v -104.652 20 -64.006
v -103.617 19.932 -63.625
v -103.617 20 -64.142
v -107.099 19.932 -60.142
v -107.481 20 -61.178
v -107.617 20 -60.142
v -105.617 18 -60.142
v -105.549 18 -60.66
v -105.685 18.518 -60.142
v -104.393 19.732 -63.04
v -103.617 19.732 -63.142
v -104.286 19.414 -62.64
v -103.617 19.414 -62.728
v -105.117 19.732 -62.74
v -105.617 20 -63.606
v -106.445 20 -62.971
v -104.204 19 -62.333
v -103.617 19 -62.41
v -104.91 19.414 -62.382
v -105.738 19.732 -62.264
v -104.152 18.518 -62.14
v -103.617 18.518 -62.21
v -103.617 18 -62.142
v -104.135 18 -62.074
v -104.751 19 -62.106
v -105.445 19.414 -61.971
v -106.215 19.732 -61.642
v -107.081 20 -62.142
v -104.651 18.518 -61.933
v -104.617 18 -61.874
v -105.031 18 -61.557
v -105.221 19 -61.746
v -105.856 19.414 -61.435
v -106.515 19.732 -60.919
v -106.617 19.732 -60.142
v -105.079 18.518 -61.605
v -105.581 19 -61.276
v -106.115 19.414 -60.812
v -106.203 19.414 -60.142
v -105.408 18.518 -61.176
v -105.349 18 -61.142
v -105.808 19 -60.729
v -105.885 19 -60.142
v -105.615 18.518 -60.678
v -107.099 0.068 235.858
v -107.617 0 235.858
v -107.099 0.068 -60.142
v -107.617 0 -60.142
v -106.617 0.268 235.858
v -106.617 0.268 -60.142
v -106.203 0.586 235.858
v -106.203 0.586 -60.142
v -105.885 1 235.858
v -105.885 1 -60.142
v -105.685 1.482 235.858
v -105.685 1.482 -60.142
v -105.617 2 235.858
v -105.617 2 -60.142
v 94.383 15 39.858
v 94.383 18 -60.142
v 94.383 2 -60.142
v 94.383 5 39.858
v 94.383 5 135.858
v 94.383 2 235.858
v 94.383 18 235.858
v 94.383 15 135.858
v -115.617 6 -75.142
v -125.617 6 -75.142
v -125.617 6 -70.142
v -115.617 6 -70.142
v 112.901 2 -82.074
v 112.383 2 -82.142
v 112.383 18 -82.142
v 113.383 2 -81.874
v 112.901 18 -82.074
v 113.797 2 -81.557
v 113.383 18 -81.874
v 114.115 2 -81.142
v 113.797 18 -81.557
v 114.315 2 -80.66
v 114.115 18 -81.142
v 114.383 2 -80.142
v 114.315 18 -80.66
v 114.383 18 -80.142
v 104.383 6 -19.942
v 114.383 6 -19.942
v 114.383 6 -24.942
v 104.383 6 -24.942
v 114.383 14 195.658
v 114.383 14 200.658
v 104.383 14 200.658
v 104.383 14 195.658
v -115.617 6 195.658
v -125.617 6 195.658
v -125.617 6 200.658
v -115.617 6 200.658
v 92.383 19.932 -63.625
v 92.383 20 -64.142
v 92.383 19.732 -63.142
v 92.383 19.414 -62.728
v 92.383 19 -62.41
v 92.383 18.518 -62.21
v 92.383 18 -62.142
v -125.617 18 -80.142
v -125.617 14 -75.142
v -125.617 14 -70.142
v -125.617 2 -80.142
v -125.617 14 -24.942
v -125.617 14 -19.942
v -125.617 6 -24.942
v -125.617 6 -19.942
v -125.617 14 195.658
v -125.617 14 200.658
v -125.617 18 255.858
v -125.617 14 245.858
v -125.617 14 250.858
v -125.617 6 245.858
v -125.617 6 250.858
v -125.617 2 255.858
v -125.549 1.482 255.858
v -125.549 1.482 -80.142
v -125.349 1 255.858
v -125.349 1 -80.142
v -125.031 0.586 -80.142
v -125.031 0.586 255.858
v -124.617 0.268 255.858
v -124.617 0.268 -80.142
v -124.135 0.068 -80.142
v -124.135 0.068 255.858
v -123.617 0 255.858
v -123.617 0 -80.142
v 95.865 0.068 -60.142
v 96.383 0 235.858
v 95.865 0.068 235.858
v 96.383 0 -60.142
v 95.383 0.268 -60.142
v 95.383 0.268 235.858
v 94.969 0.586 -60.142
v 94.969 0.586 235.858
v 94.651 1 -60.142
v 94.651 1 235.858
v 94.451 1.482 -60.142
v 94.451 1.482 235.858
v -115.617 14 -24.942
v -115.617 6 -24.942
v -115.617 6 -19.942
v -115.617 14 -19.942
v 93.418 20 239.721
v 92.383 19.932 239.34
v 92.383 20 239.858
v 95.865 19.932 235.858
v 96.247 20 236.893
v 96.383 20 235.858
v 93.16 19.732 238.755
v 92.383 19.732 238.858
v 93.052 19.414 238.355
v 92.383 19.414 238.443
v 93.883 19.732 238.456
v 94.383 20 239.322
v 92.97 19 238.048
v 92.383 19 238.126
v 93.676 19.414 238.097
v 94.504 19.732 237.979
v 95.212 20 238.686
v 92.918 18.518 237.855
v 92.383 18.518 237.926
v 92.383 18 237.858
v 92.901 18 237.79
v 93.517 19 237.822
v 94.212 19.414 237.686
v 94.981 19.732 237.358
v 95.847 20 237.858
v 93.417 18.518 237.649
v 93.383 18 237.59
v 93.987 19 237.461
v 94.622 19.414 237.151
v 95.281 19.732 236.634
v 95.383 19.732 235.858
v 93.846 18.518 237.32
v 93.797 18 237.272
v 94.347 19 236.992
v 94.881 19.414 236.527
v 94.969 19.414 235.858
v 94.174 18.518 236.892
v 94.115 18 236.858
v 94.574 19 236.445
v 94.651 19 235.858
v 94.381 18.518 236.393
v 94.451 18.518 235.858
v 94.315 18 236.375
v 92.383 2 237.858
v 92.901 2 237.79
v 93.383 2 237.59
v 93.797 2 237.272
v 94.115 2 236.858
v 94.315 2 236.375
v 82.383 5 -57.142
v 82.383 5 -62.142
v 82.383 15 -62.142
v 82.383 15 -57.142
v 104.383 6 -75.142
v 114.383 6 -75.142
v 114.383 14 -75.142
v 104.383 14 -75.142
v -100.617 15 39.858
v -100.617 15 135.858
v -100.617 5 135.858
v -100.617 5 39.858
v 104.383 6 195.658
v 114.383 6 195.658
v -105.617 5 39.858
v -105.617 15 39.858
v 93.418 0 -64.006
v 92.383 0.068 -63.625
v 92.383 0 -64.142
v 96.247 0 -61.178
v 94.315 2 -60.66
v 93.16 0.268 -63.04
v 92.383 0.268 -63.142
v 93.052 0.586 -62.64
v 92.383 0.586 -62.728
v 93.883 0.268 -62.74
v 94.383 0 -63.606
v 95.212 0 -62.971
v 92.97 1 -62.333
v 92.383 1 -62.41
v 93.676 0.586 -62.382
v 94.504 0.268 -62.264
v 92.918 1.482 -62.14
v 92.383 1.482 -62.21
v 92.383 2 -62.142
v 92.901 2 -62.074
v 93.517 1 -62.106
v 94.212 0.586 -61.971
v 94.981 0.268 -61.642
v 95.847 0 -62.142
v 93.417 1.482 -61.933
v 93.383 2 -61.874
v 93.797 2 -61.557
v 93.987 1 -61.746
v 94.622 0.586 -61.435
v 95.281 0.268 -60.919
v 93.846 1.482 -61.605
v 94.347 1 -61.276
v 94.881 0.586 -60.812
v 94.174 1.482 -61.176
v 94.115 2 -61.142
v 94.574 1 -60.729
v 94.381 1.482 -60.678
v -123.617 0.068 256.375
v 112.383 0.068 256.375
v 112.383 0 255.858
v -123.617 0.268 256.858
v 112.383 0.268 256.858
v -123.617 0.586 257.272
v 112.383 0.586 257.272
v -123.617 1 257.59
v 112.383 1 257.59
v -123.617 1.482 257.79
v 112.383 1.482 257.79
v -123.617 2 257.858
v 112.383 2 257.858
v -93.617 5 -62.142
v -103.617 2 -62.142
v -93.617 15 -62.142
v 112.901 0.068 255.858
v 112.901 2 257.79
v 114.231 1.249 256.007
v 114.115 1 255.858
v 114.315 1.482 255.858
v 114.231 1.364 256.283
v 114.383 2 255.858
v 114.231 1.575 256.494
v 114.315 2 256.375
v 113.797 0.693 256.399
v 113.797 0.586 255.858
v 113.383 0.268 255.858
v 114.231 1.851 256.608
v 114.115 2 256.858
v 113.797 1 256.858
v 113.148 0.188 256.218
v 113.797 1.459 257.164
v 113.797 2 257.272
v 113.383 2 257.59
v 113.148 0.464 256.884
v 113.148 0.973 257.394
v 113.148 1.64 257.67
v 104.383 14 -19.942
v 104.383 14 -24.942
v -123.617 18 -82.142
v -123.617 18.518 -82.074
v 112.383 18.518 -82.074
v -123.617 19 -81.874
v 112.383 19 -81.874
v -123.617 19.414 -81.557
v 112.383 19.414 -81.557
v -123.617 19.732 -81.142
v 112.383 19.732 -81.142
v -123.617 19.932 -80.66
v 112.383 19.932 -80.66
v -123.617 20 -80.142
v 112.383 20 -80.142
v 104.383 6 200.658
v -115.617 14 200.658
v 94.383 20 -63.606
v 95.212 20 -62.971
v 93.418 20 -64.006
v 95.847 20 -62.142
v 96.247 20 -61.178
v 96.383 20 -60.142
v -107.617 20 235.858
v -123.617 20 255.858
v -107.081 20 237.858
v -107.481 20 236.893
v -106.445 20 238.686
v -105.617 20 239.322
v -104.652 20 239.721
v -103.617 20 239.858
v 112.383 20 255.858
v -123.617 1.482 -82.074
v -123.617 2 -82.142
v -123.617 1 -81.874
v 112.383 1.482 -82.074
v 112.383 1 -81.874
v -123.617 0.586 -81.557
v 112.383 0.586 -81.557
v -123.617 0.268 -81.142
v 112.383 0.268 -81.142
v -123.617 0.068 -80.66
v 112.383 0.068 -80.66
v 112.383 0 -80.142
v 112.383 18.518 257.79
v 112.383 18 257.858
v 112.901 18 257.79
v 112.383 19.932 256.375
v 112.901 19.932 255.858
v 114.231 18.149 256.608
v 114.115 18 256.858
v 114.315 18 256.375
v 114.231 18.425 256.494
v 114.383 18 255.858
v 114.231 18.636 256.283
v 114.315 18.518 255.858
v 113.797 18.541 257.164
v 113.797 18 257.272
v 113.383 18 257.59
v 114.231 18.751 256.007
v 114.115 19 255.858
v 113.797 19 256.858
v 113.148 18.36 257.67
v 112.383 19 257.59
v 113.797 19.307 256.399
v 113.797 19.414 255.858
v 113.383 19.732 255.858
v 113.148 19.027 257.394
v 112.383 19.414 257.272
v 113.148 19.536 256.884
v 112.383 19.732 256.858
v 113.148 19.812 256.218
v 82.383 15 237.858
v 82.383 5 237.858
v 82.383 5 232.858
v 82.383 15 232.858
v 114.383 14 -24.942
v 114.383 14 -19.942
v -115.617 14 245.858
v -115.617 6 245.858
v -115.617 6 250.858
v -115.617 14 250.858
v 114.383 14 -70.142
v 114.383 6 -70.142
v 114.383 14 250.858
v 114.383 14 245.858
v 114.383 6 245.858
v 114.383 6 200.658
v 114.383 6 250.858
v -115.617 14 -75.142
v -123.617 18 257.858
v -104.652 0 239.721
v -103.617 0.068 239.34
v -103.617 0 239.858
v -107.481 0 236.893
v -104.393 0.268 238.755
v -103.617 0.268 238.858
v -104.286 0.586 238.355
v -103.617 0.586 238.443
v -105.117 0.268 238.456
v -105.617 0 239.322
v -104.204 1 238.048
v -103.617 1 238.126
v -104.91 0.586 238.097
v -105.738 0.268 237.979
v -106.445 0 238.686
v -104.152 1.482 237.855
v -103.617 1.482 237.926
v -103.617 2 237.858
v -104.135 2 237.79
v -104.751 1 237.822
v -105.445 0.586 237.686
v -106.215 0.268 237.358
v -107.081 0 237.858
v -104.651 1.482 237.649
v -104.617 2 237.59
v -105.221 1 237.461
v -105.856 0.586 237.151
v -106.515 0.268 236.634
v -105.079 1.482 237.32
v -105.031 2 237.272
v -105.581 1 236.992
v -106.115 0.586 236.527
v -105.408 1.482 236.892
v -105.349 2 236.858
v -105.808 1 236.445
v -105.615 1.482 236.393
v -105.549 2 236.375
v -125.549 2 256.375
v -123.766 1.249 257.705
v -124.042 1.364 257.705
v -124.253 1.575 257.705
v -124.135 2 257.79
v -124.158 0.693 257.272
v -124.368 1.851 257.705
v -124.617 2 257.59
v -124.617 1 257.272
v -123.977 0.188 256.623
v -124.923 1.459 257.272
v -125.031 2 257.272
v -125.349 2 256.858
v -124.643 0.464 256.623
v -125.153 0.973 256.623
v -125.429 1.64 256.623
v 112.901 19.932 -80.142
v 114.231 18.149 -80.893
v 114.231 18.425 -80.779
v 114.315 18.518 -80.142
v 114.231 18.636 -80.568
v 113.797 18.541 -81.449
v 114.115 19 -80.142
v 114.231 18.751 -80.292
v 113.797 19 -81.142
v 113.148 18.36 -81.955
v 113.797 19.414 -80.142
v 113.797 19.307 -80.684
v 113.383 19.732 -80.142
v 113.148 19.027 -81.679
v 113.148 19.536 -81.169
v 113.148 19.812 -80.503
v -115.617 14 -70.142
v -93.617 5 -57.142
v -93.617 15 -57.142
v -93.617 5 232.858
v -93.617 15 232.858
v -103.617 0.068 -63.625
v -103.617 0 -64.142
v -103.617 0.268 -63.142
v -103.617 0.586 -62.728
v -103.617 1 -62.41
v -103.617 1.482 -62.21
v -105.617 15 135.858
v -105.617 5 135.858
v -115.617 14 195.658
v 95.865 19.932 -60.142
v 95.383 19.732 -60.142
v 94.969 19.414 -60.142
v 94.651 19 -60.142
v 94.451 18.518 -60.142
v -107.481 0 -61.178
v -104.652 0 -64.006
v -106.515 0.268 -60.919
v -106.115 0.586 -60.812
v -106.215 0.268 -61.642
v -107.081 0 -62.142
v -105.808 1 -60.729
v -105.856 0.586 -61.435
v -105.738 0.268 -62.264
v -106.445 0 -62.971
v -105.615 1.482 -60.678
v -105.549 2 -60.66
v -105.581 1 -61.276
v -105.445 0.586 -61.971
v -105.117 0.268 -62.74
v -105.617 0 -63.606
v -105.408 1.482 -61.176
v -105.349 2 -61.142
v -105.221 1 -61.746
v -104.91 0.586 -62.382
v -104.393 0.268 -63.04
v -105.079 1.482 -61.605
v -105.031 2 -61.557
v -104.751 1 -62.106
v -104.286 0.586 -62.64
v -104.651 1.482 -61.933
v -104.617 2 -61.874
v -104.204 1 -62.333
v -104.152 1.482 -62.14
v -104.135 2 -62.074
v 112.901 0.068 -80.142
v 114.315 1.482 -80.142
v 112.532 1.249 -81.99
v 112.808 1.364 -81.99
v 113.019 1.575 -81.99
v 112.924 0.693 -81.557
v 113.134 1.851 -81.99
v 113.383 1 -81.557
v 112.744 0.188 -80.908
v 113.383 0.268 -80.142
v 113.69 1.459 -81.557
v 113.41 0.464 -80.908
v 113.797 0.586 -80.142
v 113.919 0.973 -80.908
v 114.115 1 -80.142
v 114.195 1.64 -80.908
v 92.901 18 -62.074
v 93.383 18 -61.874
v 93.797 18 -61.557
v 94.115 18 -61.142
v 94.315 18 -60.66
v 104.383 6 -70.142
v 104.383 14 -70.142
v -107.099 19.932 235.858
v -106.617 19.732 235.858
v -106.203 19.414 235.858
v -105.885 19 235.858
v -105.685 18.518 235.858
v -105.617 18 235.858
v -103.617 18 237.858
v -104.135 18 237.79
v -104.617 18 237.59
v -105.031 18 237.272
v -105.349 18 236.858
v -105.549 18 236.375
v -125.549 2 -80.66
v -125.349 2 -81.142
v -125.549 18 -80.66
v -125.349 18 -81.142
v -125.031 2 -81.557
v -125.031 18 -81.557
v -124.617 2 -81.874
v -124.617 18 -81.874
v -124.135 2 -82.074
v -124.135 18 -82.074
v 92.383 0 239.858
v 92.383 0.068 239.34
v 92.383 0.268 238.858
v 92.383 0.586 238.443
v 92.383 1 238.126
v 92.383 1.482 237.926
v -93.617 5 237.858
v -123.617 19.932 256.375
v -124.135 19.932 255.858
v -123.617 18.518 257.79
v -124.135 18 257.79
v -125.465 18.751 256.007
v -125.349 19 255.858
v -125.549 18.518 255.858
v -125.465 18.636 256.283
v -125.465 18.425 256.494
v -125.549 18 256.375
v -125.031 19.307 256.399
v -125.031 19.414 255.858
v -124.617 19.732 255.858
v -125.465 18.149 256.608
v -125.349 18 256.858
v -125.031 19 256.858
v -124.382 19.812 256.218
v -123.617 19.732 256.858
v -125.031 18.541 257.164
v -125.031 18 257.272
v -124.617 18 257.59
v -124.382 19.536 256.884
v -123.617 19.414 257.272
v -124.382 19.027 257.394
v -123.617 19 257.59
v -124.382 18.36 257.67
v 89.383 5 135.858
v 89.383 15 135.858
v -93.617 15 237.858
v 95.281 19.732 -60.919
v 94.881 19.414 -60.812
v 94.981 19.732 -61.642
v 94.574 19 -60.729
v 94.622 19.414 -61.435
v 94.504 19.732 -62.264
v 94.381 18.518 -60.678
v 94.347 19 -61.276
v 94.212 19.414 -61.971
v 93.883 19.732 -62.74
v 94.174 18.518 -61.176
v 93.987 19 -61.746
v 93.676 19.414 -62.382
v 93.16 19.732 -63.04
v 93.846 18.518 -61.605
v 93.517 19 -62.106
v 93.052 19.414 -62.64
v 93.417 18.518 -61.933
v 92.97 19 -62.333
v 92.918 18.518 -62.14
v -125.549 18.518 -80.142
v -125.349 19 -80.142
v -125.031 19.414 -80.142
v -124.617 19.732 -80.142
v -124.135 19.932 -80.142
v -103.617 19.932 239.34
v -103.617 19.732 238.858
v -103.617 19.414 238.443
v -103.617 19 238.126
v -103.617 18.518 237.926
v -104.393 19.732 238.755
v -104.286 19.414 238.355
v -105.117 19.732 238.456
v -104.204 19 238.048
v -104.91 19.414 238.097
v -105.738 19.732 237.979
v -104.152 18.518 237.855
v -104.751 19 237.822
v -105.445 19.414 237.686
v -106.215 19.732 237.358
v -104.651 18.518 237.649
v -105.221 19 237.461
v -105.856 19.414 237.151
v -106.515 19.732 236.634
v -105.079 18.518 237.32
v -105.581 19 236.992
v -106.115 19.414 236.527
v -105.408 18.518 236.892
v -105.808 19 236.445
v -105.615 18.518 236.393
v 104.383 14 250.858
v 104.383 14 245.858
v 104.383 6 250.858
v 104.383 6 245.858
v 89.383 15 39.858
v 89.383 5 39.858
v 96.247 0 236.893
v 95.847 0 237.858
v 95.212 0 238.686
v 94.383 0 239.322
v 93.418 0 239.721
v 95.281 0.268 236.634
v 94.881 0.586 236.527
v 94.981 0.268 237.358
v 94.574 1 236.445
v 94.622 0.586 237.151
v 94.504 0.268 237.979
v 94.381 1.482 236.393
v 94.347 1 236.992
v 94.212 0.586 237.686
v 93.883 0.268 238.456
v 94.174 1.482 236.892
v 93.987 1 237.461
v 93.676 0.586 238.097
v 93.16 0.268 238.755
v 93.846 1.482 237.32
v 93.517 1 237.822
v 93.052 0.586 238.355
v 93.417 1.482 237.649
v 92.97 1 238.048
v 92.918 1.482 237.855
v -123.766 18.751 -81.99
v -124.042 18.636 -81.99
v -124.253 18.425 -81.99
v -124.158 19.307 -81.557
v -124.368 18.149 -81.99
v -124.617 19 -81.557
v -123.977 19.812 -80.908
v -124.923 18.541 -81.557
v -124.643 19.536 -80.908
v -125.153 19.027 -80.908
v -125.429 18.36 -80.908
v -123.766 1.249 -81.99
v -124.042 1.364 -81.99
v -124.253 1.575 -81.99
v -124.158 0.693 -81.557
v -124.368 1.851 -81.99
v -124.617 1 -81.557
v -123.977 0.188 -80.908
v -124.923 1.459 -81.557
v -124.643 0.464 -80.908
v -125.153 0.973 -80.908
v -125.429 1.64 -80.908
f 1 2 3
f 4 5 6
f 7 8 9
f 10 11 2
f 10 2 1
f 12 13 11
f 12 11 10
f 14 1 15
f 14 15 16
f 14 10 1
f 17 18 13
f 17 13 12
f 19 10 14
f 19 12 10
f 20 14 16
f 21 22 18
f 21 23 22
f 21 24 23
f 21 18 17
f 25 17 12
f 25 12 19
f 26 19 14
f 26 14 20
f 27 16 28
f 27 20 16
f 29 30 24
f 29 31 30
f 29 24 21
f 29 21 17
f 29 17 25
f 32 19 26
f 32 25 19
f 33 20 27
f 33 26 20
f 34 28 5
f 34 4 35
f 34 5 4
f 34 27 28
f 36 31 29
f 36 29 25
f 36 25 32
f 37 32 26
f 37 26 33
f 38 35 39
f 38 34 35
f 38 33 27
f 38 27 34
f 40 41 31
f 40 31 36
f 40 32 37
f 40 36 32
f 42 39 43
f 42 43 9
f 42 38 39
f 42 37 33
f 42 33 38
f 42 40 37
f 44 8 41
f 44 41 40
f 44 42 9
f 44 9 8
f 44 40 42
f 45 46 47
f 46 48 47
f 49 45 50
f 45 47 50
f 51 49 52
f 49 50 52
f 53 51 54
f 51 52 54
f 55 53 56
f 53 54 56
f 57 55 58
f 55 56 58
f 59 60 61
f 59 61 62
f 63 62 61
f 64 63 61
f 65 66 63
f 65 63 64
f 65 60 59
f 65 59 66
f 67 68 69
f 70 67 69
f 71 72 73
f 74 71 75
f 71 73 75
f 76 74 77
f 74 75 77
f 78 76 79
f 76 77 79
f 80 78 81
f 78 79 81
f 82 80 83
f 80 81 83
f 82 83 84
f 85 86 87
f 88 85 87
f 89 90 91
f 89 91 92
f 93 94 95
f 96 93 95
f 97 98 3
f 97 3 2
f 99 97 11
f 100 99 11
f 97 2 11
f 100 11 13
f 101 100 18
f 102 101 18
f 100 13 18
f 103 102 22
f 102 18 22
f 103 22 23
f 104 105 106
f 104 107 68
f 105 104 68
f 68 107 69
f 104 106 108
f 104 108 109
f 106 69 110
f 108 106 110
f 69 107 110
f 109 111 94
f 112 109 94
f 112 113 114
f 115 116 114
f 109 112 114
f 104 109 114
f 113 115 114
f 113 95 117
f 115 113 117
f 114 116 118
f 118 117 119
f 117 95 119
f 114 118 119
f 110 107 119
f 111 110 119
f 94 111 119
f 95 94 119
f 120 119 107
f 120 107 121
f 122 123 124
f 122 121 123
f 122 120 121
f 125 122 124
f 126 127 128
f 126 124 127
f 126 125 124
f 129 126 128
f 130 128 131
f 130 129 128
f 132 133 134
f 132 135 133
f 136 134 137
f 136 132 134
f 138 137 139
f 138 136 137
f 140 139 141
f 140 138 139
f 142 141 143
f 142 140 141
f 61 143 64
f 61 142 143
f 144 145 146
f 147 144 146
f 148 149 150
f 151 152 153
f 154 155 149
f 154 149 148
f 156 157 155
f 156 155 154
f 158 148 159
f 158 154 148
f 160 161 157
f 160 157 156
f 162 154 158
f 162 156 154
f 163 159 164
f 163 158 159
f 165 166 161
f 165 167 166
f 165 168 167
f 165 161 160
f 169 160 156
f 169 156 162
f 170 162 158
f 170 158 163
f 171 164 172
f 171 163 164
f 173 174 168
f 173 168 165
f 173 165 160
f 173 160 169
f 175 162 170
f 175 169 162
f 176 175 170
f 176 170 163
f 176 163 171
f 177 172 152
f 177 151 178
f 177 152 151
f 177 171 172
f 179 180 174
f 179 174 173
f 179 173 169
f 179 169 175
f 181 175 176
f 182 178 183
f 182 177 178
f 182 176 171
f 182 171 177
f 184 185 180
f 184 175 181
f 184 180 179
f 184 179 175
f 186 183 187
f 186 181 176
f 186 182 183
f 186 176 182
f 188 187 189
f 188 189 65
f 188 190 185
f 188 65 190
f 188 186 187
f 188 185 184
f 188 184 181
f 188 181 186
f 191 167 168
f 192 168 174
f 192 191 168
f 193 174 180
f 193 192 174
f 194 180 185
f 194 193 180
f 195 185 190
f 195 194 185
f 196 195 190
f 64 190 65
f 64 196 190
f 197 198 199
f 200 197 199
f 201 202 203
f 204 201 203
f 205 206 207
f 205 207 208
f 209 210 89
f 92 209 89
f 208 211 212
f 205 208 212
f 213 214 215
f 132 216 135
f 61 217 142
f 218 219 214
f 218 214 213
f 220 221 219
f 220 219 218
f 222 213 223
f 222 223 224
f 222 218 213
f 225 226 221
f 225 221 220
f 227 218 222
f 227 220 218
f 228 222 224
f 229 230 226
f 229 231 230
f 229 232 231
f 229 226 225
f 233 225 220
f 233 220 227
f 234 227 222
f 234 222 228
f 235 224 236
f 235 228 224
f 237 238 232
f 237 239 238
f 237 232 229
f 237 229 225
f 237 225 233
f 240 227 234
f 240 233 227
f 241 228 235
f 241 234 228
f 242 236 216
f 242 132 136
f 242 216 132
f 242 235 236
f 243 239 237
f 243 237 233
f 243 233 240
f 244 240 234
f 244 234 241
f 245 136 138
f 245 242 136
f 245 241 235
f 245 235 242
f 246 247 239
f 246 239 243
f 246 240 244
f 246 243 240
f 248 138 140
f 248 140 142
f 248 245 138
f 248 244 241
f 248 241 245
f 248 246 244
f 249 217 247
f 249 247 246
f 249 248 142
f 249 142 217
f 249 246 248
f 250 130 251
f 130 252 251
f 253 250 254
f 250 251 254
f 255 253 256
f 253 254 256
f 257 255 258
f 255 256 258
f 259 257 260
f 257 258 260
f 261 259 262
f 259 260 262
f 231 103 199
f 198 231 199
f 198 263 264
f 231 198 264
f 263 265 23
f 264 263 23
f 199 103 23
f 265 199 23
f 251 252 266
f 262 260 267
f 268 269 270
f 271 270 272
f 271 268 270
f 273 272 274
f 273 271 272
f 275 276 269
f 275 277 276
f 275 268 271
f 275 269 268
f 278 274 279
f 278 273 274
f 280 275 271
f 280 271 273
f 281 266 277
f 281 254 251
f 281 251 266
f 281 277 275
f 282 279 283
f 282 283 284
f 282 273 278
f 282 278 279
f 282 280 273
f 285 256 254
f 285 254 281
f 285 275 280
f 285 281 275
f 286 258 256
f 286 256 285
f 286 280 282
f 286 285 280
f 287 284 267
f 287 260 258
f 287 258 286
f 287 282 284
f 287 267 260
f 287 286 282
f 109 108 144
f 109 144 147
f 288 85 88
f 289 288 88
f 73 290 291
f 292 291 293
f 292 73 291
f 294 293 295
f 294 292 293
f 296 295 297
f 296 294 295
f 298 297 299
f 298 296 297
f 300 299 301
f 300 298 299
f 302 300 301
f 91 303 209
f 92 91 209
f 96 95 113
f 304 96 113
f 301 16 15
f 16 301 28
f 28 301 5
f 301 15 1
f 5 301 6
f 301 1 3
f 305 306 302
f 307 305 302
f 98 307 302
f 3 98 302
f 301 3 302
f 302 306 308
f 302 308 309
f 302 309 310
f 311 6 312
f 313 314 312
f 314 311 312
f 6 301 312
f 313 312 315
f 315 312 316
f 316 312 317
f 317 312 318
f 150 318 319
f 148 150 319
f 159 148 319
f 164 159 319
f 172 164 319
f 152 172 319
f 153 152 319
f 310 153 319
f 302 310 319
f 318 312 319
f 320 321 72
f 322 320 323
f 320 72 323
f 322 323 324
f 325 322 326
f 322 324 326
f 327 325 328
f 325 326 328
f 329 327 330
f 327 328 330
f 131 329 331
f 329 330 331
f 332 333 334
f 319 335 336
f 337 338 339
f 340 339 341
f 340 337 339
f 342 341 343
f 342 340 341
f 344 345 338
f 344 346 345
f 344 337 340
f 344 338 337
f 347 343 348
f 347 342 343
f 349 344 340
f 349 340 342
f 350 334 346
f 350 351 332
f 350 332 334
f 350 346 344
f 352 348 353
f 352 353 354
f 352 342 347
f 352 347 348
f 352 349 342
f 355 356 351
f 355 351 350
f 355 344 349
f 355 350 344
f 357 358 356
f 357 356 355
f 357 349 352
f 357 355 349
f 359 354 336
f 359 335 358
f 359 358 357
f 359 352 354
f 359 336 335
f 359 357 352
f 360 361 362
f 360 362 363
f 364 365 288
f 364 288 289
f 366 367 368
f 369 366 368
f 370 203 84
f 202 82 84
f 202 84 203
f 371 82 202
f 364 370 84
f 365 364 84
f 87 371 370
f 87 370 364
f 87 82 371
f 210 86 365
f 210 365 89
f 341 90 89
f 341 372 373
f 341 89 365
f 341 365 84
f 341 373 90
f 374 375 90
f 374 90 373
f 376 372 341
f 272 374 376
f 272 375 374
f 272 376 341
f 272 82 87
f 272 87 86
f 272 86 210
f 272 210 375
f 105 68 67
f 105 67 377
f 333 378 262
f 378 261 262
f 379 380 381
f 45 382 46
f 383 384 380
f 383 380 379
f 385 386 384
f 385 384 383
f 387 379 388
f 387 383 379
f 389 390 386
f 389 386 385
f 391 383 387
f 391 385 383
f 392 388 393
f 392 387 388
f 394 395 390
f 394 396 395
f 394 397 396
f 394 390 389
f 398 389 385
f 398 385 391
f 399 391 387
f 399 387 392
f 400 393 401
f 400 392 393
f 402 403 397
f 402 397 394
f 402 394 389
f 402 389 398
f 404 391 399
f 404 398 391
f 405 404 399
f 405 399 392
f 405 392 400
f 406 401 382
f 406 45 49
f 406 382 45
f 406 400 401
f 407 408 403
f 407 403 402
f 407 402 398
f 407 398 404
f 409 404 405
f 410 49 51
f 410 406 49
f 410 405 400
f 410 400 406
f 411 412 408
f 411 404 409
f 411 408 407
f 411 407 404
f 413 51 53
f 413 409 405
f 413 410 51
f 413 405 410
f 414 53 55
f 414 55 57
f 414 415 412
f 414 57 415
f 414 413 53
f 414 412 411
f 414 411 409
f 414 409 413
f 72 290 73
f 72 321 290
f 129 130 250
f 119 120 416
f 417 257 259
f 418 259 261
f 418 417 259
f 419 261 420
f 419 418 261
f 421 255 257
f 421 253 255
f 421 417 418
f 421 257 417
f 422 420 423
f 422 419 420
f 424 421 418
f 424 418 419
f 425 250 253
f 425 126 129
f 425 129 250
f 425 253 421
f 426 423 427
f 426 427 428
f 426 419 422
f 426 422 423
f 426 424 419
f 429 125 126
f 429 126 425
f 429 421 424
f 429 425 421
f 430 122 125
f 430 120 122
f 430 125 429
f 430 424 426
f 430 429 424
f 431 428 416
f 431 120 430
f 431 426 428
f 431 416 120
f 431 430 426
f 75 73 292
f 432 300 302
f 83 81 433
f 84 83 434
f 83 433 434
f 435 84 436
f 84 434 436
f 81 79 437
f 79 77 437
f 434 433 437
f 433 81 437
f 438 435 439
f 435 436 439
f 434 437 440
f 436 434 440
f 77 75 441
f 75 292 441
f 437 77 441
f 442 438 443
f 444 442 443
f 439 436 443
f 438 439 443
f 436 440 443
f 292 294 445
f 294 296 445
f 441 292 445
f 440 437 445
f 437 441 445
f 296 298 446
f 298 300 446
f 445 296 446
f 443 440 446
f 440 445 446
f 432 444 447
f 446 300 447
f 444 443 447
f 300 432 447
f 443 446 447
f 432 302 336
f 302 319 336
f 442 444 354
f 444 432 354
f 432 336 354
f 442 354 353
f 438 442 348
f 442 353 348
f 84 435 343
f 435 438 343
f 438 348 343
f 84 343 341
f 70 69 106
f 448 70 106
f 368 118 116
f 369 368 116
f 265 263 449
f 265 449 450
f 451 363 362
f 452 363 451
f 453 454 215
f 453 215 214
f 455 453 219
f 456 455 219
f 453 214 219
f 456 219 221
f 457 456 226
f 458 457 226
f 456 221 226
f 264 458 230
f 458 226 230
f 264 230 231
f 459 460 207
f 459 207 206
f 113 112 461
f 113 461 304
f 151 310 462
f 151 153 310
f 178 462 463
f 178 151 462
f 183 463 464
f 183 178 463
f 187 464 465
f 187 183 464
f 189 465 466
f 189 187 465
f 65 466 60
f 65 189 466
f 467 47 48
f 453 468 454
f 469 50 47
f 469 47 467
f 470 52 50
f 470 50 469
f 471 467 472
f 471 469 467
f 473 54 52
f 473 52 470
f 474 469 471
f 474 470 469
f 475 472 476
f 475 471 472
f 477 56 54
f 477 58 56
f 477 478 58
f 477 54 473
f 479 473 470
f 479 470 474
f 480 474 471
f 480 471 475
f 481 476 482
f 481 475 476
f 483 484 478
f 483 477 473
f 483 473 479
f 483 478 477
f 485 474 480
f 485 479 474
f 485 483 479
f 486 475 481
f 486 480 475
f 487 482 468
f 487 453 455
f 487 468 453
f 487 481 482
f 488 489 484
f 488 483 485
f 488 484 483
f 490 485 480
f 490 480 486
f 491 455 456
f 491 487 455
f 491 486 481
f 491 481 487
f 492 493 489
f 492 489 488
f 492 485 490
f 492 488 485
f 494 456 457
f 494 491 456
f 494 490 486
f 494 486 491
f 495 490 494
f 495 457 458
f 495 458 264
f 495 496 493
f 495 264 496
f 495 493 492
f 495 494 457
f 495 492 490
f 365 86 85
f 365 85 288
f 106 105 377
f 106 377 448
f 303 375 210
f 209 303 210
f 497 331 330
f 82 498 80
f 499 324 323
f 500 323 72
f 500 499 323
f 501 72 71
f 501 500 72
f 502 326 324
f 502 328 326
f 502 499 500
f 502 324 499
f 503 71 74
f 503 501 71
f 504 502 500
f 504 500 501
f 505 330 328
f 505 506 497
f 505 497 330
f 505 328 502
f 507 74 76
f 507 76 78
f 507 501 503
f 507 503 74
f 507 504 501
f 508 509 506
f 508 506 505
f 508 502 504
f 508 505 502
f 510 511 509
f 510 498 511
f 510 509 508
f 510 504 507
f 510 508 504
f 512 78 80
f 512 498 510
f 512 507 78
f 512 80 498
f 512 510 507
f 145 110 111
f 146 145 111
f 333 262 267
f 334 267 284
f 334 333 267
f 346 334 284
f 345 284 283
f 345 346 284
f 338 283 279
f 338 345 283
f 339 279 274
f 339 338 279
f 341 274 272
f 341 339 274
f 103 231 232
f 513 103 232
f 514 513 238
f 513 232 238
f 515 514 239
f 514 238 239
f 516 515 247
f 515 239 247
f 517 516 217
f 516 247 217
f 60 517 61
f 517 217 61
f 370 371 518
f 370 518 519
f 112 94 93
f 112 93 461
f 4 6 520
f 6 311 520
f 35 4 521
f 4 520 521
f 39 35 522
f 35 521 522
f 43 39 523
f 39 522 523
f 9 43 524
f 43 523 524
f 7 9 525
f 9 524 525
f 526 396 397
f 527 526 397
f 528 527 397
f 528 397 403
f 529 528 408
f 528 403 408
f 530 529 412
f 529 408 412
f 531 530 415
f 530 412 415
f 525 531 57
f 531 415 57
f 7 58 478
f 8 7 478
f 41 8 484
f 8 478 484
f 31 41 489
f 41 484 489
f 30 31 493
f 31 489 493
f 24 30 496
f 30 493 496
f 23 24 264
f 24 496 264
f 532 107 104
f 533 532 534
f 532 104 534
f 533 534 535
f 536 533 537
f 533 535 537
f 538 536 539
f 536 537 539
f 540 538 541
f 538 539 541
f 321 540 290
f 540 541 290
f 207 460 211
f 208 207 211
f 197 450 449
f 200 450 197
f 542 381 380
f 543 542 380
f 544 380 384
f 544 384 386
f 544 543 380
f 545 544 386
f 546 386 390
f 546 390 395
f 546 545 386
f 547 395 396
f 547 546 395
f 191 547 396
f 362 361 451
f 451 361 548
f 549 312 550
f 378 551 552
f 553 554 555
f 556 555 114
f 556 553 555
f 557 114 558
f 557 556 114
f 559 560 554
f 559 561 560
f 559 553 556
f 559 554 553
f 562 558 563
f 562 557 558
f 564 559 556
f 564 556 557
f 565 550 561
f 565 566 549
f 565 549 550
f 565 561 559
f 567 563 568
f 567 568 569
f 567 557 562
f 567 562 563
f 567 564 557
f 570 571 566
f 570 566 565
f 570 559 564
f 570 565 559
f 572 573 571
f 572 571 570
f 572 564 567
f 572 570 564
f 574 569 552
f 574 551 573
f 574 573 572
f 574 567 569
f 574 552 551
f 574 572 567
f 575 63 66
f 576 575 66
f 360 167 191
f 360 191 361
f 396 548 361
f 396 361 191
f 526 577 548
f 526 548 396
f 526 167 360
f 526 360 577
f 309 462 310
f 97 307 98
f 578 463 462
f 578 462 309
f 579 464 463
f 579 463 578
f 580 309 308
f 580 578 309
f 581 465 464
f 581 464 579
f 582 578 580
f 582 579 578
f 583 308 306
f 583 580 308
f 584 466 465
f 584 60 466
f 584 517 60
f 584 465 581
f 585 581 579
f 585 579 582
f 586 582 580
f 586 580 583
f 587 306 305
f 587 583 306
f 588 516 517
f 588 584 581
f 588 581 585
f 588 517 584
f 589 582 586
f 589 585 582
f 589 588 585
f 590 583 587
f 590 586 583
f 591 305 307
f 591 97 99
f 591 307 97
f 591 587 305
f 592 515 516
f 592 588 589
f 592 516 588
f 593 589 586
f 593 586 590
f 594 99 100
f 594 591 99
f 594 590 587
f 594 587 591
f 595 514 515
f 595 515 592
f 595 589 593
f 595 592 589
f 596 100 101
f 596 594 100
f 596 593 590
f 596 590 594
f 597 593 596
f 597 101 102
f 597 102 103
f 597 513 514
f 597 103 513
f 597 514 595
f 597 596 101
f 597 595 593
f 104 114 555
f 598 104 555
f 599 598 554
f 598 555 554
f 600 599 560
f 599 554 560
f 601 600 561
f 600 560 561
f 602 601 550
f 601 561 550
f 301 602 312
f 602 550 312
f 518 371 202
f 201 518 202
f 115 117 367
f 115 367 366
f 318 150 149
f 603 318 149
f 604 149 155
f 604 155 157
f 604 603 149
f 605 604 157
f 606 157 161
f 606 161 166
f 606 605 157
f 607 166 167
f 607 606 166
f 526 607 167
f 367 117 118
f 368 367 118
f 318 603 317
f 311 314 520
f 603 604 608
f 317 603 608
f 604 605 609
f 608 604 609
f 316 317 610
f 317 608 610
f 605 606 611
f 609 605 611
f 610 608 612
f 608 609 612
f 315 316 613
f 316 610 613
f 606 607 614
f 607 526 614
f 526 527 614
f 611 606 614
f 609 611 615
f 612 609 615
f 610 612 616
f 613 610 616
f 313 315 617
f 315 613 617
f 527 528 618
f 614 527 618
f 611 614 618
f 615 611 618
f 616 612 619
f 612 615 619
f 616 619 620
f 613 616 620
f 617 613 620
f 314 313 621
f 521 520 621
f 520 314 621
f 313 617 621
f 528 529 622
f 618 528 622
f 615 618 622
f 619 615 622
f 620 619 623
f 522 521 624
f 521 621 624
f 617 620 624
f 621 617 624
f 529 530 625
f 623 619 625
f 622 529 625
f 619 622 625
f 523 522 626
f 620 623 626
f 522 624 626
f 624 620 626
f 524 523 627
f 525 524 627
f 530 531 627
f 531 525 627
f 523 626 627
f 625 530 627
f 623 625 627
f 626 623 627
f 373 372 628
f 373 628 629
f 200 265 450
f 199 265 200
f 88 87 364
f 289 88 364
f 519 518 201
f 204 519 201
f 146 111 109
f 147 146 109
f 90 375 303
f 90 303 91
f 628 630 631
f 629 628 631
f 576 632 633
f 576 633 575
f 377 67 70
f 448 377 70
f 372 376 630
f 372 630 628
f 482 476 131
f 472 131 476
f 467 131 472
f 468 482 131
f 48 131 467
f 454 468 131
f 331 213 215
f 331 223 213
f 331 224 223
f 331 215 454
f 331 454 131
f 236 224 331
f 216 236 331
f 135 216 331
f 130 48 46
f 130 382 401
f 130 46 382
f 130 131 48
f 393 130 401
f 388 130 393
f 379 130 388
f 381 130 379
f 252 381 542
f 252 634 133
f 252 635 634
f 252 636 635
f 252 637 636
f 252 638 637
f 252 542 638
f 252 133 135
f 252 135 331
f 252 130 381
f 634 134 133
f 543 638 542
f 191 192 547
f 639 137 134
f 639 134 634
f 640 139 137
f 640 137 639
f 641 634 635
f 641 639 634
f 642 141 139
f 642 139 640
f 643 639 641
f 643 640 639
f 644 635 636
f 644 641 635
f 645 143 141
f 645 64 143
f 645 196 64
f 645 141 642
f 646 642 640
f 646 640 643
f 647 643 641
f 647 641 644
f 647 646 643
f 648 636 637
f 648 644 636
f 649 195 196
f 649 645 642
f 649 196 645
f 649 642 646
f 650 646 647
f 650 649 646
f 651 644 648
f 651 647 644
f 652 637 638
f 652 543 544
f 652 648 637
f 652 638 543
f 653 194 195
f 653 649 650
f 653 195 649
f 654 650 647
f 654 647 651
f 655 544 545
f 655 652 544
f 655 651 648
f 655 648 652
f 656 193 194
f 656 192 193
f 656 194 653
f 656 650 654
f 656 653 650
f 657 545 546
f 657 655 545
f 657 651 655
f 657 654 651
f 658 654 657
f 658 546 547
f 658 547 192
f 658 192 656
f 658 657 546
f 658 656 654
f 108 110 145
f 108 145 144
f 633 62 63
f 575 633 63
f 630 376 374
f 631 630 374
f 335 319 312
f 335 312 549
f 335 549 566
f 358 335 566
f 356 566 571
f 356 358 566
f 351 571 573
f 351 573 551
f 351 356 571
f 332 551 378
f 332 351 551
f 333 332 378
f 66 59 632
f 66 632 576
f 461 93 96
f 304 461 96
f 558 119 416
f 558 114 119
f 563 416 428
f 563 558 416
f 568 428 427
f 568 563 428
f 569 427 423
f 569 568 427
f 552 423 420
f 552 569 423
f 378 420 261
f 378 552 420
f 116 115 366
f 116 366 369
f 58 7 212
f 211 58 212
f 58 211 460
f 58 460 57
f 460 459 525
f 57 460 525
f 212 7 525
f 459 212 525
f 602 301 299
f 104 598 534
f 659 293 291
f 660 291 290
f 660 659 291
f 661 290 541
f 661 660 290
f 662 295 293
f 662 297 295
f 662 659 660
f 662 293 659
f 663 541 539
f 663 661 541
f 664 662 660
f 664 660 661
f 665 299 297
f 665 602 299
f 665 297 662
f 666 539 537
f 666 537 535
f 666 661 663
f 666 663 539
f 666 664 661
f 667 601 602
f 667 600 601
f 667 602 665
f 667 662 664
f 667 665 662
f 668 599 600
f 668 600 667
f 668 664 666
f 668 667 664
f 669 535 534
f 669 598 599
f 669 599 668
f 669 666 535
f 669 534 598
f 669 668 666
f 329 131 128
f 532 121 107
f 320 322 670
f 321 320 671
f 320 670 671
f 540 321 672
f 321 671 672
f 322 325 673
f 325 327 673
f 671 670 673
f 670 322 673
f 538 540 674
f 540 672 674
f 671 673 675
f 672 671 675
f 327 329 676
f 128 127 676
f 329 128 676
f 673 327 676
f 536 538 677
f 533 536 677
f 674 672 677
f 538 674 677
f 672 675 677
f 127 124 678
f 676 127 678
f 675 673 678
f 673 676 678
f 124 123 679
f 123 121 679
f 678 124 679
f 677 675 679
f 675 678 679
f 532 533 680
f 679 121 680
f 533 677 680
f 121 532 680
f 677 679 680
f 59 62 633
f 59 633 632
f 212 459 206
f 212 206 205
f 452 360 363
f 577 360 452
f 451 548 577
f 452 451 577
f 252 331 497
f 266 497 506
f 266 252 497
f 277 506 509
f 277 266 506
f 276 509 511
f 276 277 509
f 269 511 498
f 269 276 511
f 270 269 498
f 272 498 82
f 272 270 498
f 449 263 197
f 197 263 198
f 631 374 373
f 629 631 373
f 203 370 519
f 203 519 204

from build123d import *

# Parameters (mm, degrees)
SKETCH1_W           = 240
SKETCH1_H           = 340
BOSS_EXTRUDE1_DEPTH = 20
SKETCH2_W           = 200
SKETCH2_H           = 300
CUT_EXTRUDE1_DEPTH  = 288.524209706
SKETCH3_W           = 96
SKETCH3_H           = 10
BOSS_EXTRUDE2_DEPTH = 5
SKETCH4_W           = 96
SKETCH4_H           = 10
BOSS_EXTRUDE3_DEPTH = 5
SKETCH5_W           = 176
SKETCH5_H           = 10
BOSS_EXTRUDE4_DEPTH = 5
SKETCH6_W           = 176
SKETCH6_H           = 10
BOSS_EXTRUDE5_DEPTH = 5
SKETCH7_W           = 5
SKETCH7_H           = 8
CUT_EXTRUDE2_DEPTH  = 10
SKETCH8_W           = 5
SKETCH8_H           = 8
CUT_EXTRUDE3_DEPTH  = 10
SKETCH9_W           = 5
SKETCH9_H           = 8
CUT_EXTRUDE4_DEPTH  = 10
SKETCH10_W          = 5
SKETCH10_H          = 8
CUT_EXTRUDE5_DEPTH  = 10
SKETCH11_W          = 5
SKETCH11_H          = 8
CUT_EXTRUDE6_DEPTH  = 10
SKETCH12_W          = 5
SKETCH12_H          = 8
CUT_EXTRUDE7_DEPTH  = 10
SKETCH13_W          = 5
SKETCH13_H          = 8
CUT_EXTRUDE8_DEPTH  = 10
SKETCH14_W          = 5
SKETCH14_H          = 8
CUT_EXTRUDE9_DEPTH  = 10
FILLET1_R           = 2


with BuildPart() as part:
    # Sketch1 → Boss-Extrude1 (new body)
    with BuildSketch(Plane.XZ):
        with Locations((-5.61688401, 87.857653791)):
            Rectangle(SKETCH1_W, SKETCH1_H)
    extrude(amount=-BOSS_EXTRUDE1_DEPTH)

    # Sketch2 → Cut-Extrude1 (cut, through all)
    with BuildSketch(Plane(origin=(0, 20, 0), x_dir=(-1, 0, 0), z_dir=(0, 1, 0))):
        with Locations((5.61688401, 87.857653791)):
            Rectangle(SKETCH2_W, SKETCH2_H)
    extrude(amount=-CUT_EXTRUDE1_DEPTH, mode=Mode.SUBTRACT)

    # Sketch3 → Boss-Extrude2 (add)
    with BuildSketch(Plane(origin=(-105.61688401, 0, 0), x_dir=(0, 0, -1), z_dir=(1, 0, 0))):
        with Locations((-87.857653791, 10)):
            Rectangle(SKETCH3_W, SKETCH3_H)
    extrude(amount=BOSS_EXTRUDE2_DEPTH)

    # Sketch4 → Boss-Extrude3 (add)
    with BuildSketch(Plane.ZY.offset(-94.38311599)):
        with Locations((87.857653791, 10)):
            Rectangle(SKETCH4_W, SKETCH4_H)
    extrude(amount=BOSS_EXTRUDE3_DEPTH)

    # Sketch5 → Boss-Extrude4 (add)
    with BuildSketch(Plane(origin=(0, 0, 237.857653791), x_dir=(-1, 0, 0), z_dir=(0, 0, -1))):
        with Locations((5.61688401, 10)):
            Rectangle(SKETCH5_W, SKETCH5_H)
    extrude(amount=BOSS_EXTRUDE4_DEPTH)

    # Sketch6 → Boss-Extrude5 (add)
    with BuildSketch(Plane.XY.offset(-62.142346209)):
        with Locations((-5.61688401, 10)):
            Rectangle(SKETCH6_W, SKETCH6_H)
    extrude(amount=BOSS_EXTRUDE5_DEPTH)

    # Sketch7 → Cut-Extrude2 (cut)
    with BuildSketch(Plane(origin=(114.38311599, 0, 0), x_dir=(0, 0, -1), z_dir=(1, 0, 0))):
        with Locations((-248.357653791, 10)):
            Rectangle(SKETCH7_W, SKETCH7_H)
    extrude(amount=-CUT_EXTRUDE2_DEPTH, mode=Mode.SUBTRACT)

    # Sketch8 → Cut-Extrude3 (cut)
    with BuildSketch(Plane(origin=(114.38311599, 0, 0), x_dir=(0, 0, -1), z_dir=(1, 0, 0))):
        with Locations((-198.157653791, 10)):
            Rectangle(SKETCH8_W, SKETCH8_H)
    extrude(amount=-CUT_EXTRUDE3_DEPTH, mode=Mode.SUBTRACT)

    # Sketch9 → Cut-Extrude4 (cut)
    with BuildSketch(Plane(origin=(114.38311599, 0, 0), x_dir=(0, 0, -1), z_dir=(1, 0, 0))):
        with Locations((22.442346209, 10)):
            Rectangle(SKETCH9_W, SKETCH9_H)
    extrude(amount=-CUT_EXTRUDE4_DEPTH, mode=Mode.SUBTRACT)

    # Sketch10 → Cut-Extrude5 (cut)
    with BuildSketch(Plane(origin=(114.38311599, 0, 0), x_dir=(0, 0, -1), z_dir=(1, 0, 0))):
        with Locations((72.642346209, 10)):
            Rectangle(SKETCH10_W, SKETCH10_H)
    extrude(amount=-CUT_EXTRUDE5_DEPTH, mode=Mode.SUBTRACT)

    # Sketch11 → Cut-Extrude6 (cut)
    with BuildSketch(Plane.ZY.offset(125.61688401)):
        with Locations((248.357653791, 10)):
            Rectangle(SKETCH11_W, SKETCH11_H)
    extrude(amount=-CUT_EXTRUDE6_DEPTH, mode=Mode.SUBTRACT)

    # Sketch12 → Cut-Extrude7 (cut)
    with BuildSketch(Plane.ZY.offset(125.61688401)):
        with Locations((198.157653791, 10)):
            Rectangle(SKETCH12_W, SKETCH12_H)
    extrude(amount=-CUT_EXTRUDE7_DEPTH, mode=Mode.SUBTRACT)

    # Sketch13 → Cut-Extrude8 (cut)
    with BuildSketch(Plane.ZY.offset(125.61688401)):
        with Locations((-22.442346209, 10)):
            Rectangle(SKETCH13_W, SKETCH13_H)
    extrude(amount=-CUT_EXTRUDE8_DEPTH, mode=Mode.SUBTRACT)

    # Sketch14 → Cut-Extrude9 (cut)
    with BuildSketch(Plane.ZY.offset(125.61688401)):
        with Locations((-72.642346209, 10)):
            Rectangle(SKETCH14_W, SKETCH14_H)
    extrude(amount=-CUT_EXTRUDE9_DEPTH, mode=Mode.SUBTRACT)

    # Fillet1
    fillet1_edges = [part.edges().sort_by_distance(p)[0] for p in [
        (-5.61688401, 20, 257.857653791),
        (-125.61688401, 20, 87.857653791),
        (-5.61688401, 0, 237.857653791),
        (94.38311599, 10, 237.857653791),
        (-105.61688401, 0, 87.857653791),
        (-105.61688401, 10, 237.857653791),
        (-5.61688401, 0, -62.142346209),
        (-105.61688401, 10, -62.142346209),
        (94.38311599, 0, 87.857653791),
        (94.38311599, 10, -62.142346209),
        (-5.61688401, 20, 237.857653791),
        (94.38311599, 20, 87.857653791),
        (-5.61688401, 20, -62.142346209),
        (-105.61688401, 20, 87.857653791),
        (-5.61688401, 20, -82.142346209),
        (-125.61688401, 0, 87.857653791),
        (-5.61688401, 0, 257.857653791),
        (114.38311599, 0, 87.857653791),
        (-5.61688401, 0, -82.142346209),
        (-125.61688401, 10, -82.142346209),
        (-125.61688401, 10, 257.857653791),
        (114.38311599, 10, 257.857653791),
        (114.38311599, 10, -82.142346209),
        (114.38311599, 20, 87.857653791),
    ]]
    fillet(fillet1_edges, radius=FILLET1_R)


solid = part.part
